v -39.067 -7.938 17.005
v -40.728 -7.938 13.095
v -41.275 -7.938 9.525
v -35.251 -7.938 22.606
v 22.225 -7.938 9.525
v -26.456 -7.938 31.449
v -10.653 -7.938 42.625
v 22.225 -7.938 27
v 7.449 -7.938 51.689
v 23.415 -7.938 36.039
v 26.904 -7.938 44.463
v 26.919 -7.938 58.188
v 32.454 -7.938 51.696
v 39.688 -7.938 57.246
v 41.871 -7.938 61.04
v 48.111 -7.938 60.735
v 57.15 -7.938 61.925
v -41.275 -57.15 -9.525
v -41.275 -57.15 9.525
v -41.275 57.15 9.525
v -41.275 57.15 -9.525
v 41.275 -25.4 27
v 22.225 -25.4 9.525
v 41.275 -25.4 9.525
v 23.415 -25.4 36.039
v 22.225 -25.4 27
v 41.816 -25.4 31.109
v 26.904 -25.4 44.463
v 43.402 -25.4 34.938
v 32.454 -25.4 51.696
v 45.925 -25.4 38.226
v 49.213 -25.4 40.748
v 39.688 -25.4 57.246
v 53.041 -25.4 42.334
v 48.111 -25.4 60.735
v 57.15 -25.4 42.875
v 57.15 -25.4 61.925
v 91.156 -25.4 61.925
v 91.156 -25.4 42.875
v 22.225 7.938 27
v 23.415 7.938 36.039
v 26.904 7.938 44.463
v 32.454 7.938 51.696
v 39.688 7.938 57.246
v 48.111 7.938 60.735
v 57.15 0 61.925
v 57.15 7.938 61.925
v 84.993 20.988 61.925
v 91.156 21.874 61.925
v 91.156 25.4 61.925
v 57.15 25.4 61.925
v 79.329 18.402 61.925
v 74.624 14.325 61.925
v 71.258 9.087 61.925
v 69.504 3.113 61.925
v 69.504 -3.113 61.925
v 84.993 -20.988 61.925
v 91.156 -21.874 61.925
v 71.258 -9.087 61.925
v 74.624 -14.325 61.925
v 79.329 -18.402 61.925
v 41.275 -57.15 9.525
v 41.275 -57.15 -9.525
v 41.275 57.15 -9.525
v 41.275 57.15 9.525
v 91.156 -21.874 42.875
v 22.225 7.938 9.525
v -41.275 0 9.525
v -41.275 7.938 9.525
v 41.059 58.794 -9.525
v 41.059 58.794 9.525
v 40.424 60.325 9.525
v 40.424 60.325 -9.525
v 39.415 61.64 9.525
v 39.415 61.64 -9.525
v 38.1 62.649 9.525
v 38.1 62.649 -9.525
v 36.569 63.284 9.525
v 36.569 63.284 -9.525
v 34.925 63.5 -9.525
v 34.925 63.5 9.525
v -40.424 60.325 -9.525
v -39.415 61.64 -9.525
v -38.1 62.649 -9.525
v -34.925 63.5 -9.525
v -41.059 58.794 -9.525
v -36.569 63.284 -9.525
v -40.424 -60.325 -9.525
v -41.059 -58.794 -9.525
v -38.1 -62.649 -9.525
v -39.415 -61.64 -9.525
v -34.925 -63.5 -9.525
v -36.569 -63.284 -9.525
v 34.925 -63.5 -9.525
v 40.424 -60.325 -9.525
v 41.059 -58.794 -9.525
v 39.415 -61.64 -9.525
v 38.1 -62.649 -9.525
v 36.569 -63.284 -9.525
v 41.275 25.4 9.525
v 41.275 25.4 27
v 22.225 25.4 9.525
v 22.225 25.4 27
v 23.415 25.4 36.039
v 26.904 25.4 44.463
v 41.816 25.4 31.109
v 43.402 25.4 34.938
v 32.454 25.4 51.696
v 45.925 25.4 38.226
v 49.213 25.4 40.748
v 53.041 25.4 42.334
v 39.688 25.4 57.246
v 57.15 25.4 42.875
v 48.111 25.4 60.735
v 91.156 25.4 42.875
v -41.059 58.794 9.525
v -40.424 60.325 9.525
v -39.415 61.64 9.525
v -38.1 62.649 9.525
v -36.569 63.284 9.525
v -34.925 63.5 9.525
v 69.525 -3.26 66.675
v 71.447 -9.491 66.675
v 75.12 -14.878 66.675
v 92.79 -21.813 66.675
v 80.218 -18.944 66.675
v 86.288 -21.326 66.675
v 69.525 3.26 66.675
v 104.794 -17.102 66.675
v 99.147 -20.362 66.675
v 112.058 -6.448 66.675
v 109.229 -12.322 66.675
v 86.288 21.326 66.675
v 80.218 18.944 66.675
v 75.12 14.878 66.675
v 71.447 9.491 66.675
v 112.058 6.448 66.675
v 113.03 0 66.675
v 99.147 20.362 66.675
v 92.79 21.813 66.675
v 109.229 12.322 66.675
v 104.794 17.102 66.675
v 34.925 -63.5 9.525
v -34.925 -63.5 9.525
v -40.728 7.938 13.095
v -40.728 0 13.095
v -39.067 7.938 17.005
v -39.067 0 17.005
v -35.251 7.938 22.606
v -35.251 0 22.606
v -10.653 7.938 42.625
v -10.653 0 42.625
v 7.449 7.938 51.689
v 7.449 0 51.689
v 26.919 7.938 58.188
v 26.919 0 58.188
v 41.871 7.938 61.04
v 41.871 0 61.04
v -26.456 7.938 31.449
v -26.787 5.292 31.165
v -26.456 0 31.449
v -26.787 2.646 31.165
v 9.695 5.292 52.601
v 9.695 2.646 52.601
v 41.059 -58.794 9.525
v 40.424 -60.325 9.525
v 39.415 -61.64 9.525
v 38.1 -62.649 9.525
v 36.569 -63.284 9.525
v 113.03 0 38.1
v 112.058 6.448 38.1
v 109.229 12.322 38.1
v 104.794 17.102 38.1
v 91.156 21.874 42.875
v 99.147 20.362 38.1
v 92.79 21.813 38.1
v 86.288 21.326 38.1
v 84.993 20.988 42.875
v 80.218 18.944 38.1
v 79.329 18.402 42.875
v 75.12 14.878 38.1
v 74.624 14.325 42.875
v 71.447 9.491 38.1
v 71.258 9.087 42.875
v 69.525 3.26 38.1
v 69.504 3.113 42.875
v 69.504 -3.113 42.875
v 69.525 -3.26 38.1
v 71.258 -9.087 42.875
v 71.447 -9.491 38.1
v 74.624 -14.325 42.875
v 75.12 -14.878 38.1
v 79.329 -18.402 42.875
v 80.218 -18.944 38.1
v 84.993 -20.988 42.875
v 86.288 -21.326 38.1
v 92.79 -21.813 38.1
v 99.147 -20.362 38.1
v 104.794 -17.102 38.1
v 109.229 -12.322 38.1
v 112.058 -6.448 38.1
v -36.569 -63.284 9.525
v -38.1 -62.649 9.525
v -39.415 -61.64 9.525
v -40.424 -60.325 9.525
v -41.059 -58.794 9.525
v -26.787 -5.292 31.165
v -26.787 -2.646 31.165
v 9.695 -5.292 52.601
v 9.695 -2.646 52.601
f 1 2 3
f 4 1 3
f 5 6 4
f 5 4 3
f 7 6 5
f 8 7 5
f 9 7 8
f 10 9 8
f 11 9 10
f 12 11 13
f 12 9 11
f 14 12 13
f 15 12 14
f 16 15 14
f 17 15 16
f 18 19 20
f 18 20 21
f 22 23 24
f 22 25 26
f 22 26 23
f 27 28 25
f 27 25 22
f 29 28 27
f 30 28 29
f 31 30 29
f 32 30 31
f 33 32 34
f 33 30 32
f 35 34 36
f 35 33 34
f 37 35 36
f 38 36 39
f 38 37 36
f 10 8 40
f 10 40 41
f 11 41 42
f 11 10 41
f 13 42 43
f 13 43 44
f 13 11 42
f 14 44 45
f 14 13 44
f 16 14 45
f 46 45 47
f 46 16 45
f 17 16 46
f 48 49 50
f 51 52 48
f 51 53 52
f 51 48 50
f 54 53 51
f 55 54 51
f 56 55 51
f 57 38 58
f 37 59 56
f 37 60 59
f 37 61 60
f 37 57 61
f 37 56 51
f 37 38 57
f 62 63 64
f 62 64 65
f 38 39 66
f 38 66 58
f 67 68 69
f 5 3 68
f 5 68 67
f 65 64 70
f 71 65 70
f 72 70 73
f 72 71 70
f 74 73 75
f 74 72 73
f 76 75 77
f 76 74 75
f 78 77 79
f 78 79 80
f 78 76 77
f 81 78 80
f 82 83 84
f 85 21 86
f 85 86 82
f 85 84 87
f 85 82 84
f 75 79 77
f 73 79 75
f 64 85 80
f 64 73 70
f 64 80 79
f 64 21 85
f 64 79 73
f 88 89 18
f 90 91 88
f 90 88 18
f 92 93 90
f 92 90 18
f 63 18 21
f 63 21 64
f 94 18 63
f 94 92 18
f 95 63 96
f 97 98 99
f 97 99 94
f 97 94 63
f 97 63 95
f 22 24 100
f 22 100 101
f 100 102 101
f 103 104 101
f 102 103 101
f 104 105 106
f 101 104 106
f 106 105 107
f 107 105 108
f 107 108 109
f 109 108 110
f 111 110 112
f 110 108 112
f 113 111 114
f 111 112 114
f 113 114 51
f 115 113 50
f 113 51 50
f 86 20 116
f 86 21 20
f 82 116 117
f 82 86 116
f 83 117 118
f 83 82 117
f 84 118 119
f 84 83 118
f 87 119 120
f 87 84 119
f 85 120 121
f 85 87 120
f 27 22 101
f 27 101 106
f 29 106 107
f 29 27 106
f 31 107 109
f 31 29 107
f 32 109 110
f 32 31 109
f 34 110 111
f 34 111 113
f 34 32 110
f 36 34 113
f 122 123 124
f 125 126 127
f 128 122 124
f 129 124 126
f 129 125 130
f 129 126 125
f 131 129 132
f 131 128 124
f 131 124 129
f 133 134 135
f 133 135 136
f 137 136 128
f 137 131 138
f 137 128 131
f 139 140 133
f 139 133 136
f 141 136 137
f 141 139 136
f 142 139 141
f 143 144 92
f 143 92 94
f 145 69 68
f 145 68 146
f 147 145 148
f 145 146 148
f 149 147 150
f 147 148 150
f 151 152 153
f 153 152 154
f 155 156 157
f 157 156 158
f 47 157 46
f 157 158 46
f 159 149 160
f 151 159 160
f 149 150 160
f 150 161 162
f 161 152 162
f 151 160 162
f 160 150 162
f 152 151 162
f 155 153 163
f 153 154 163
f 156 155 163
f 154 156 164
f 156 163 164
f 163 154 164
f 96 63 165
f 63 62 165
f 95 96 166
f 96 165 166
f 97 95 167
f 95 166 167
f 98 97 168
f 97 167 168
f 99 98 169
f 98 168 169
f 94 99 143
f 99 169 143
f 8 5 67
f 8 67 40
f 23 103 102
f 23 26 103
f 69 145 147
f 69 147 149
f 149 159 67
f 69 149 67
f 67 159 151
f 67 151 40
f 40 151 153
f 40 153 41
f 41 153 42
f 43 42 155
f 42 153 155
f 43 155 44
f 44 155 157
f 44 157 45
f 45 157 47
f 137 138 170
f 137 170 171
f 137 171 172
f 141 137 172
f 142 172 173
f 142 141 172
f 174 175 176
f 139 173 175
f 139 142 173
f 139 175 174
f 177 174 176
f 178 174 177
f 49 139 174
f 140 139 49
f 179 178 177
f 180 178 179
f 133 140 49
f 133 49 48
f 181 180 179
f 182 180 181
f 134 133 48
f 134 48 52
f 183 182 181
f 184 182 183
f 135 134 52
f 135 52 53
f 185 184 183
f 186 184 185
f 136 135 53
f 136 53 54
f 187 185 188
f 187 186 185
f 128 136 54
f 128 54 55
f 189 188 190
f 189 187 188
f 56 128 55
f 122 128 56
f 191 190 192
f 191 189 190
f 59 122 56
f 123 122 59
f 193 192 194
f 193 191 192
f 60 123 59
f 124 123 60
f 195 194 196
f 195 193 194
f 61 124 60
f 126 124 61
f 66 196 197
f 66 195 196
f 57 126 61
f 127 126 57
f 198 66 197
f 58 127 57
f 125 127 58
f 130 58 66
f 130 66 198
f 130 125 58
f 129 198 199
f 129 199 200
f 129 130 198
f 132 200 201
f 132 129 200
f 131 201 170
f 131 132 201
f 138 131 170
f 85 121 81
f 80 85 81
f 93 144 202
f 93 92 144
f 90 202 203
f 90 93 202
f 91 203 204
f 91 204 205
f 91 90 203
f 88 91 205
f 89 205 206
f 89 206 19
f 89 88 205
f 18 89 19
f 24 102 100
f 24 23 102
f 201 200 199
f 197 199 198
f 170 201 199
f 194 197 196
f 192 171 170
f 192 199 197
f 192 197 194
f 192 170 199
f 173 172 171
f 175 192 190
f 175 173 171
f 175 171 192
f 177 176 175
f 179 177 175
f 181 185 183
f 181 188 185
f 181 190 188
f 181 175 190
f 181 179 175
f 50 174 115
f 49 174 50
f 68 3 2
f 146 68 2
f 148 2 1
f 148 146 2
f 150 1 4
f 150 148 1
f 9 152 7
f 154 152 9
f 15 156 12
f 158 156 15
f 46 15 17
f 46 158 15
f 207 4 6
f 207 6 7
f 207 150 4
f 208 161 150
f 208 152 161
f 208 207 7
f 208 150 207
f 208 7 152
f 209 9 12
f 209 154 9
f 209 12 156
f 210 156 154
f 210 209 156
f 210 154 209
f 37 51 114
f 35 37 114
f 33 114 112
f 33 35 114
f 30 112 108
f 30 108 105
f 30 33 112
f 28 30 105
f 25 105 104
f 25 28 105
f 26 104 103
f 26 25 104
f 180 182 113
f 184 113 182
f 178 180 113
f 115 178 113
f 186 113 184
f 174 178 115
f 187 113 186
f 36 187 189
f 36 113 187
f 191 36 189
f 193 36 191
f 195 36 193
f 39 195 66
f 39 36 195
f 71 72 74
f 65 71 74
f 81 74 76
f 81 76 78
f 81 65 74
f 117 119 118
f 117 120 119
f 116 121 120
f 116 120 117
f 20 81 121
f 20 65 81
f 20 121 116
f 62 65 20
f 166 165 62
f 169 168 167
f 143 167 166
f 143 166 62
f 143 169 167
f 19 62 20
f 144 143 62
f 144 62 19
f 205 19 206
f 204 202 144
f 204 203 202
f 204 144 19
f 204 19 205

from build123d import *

# Parameters (mm, degrees)
F1_DEPTH = 63.5
F0_W     = 28.925544
F0_H     = 19.05
F2_DEPTH = 25.4
F3_DEPTH = 7.9375
F5_R     = 6.35
F6_R     = 6.35
F7_R     = 6.35


with BuildPart() as f1:
    # F0 (on Front) → F1 (new body, symmetric)
    with BuildSketch(Plane.XZ):
        Polygon((41.275, -9.525), (41.275, 9.525), (22.225, 9.525), (-41.275, 9.525), (-41.275, -9.525), align=None)
    extrude(amount=F1_DEPTH, both=True)

    # F5
    f5_edges = [f1.edges().sort_by_distance(p)[0] for p in [
        (41.275, -63.5, 0),
    ]]
    fillet(f5_edges, radius=F5_R)

    # F6
    f6_edges = [f1.edges().sort_by_distance(p)[0] for p in [
        (-41.275, -63.5, 0),
    ]]
    fillet(f6_edges, radius=F6_R)

    # F7
    f7_edges = [f1.edges().sort_by_distance(p)[0] for p in [
        (-41.275, 63.5, 0),
        (41.275, 63.5, 0),
    ]]
    fillet(f7_edges, radius=F7_R)


with BuildPart() as f2:
    # F0 (on Front) → F2 (new body, symmetric)
    with BuildSketch(Plane.XZ):
        with BuildLine():
            Line((22.225, 9.525), (41.275, 9.525))
            Line((41.275, 9.525), (41.275, 27.0002))
            ThreePointArc((41.275, 27.0002), (45.92468, 38.22552), (57.15, 42.8752))
            Line((57.15, 42.8752), (62.23, 42.8752))
            Line((62.23, 42.8752), (62.23, 61.9252))
            Line((62.23, 61.9252), (57.15, 61.9252))
            ThreePointArc((57.15, 61.9252), (32.454296, 51.695904), (22.225, 27.0002))
            Line((22.225, 27.0002), (22.225, 9.525))
        make_face()
        with Locations((76.692772, 52.4002)):
            Rectangle(F0_W, F0_H)
    extrude(amount=F2_DEPTH, both=True)

    # F0 (on Front) → F4 (revolve)
    with BuildSketch(Plane.XZ):
        Polygon((91.155544, 61.9252), (91.155544, 42.8752), (91.155544, 38.1), (113.03, 38.1), (113.03, 66.675), (91.155544, 66.675), align=None)
    revolve(axis=Axis((91.155544, 0, 52.4002), (0, 0, 1)))


with BuildPart() as f3:
    # F0 (on Front) → F3 (new body, symmetric)
    with BuildSketch(Plane.XZ):
        with BuildLine():
            Line((-41.275, 9.525), (22.225, 9.525))
            Line((22.225, 9.525), (22.225, 27.0002))
            ThreePointArc((22.225, 27.0002), (32.454296, 51.695904), (57.15, 61.9252))
            add(Edge.make_bspline(
                [(-41.275, 9.525), (-41.45883, 27.298592), (7.883017, 62.626183), (57.15, 61.9252)],
                knots=[0, 0, 0, 0, 111.504536, 111.504536, 111.504536, 111.504536], degree=3))
        make_face()
    extrude(amount=F3_DEPTH, both=True)


solid = Compound([f1.part, f2.part, f3.part])
